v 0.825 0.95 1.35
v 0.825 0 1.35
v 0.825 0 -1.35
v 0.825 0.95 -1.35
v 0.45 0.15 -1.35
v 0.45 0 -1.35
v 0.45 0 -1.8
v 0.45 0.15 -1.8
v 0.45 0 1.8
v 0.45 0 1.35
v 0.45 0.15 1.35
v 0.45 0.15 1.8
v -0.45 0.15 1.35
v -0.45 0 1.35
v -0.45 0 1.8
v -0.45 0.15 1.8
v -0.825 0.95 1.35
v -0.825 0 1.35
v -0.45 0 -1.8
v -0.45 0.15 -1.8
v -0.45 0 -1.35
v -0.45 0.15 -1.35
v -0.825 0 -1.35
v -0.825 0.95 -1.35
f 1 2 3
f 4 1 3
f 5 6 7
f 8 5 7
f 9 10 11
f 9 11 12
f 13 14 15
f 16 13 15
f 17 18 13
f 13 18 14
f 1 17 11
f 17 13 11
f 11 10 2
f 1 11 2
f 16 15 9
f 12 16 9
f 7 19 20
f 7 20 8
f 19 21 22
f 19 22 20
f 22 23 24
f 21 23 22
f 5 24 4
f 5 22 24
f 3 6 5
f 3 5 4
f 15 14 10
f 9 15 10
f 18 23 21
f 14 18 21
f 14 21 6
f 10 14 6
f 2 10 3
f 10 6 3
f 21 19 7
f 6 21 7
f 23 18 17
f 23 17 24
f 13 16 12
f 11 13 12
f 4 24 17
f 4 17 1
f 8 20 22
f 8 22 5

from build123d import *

# Parameters (mm, degrees)
BASES_W    = 1.65
BASES_H    = 2.7
BASE_DEPTH = 0.95
LEGS_W     = 0.9
LEGS_H     = 0.45
LEG_DEPTH  = 0.15


with BuildPart() as part:
    # BaseS → Base (new body)
    with BuildSketch(Plane(origin=(0, 0, 0), x_dir=(1, 0, 0), z_dir=(0, 1, 0))):
        Rectangle(BASES_W, BASES_H)
    extrude(amount=BASE_DEPTH)

    # LegS → Leg (add)
    with BuildSketch(Plane(origin=(0, 0, 0), x_dir=(1, 0, 0), z_dir=(0, 1, 0))):
        with Locations((0, 1.575)):
            Rectangle(LEGS_W, LEGS_H)
    leg = extrude(amount=LEG_DEPTH)

    # LVM: Leg across plane
    add(leg.mirror(Plane.XY))


solid = part.part
